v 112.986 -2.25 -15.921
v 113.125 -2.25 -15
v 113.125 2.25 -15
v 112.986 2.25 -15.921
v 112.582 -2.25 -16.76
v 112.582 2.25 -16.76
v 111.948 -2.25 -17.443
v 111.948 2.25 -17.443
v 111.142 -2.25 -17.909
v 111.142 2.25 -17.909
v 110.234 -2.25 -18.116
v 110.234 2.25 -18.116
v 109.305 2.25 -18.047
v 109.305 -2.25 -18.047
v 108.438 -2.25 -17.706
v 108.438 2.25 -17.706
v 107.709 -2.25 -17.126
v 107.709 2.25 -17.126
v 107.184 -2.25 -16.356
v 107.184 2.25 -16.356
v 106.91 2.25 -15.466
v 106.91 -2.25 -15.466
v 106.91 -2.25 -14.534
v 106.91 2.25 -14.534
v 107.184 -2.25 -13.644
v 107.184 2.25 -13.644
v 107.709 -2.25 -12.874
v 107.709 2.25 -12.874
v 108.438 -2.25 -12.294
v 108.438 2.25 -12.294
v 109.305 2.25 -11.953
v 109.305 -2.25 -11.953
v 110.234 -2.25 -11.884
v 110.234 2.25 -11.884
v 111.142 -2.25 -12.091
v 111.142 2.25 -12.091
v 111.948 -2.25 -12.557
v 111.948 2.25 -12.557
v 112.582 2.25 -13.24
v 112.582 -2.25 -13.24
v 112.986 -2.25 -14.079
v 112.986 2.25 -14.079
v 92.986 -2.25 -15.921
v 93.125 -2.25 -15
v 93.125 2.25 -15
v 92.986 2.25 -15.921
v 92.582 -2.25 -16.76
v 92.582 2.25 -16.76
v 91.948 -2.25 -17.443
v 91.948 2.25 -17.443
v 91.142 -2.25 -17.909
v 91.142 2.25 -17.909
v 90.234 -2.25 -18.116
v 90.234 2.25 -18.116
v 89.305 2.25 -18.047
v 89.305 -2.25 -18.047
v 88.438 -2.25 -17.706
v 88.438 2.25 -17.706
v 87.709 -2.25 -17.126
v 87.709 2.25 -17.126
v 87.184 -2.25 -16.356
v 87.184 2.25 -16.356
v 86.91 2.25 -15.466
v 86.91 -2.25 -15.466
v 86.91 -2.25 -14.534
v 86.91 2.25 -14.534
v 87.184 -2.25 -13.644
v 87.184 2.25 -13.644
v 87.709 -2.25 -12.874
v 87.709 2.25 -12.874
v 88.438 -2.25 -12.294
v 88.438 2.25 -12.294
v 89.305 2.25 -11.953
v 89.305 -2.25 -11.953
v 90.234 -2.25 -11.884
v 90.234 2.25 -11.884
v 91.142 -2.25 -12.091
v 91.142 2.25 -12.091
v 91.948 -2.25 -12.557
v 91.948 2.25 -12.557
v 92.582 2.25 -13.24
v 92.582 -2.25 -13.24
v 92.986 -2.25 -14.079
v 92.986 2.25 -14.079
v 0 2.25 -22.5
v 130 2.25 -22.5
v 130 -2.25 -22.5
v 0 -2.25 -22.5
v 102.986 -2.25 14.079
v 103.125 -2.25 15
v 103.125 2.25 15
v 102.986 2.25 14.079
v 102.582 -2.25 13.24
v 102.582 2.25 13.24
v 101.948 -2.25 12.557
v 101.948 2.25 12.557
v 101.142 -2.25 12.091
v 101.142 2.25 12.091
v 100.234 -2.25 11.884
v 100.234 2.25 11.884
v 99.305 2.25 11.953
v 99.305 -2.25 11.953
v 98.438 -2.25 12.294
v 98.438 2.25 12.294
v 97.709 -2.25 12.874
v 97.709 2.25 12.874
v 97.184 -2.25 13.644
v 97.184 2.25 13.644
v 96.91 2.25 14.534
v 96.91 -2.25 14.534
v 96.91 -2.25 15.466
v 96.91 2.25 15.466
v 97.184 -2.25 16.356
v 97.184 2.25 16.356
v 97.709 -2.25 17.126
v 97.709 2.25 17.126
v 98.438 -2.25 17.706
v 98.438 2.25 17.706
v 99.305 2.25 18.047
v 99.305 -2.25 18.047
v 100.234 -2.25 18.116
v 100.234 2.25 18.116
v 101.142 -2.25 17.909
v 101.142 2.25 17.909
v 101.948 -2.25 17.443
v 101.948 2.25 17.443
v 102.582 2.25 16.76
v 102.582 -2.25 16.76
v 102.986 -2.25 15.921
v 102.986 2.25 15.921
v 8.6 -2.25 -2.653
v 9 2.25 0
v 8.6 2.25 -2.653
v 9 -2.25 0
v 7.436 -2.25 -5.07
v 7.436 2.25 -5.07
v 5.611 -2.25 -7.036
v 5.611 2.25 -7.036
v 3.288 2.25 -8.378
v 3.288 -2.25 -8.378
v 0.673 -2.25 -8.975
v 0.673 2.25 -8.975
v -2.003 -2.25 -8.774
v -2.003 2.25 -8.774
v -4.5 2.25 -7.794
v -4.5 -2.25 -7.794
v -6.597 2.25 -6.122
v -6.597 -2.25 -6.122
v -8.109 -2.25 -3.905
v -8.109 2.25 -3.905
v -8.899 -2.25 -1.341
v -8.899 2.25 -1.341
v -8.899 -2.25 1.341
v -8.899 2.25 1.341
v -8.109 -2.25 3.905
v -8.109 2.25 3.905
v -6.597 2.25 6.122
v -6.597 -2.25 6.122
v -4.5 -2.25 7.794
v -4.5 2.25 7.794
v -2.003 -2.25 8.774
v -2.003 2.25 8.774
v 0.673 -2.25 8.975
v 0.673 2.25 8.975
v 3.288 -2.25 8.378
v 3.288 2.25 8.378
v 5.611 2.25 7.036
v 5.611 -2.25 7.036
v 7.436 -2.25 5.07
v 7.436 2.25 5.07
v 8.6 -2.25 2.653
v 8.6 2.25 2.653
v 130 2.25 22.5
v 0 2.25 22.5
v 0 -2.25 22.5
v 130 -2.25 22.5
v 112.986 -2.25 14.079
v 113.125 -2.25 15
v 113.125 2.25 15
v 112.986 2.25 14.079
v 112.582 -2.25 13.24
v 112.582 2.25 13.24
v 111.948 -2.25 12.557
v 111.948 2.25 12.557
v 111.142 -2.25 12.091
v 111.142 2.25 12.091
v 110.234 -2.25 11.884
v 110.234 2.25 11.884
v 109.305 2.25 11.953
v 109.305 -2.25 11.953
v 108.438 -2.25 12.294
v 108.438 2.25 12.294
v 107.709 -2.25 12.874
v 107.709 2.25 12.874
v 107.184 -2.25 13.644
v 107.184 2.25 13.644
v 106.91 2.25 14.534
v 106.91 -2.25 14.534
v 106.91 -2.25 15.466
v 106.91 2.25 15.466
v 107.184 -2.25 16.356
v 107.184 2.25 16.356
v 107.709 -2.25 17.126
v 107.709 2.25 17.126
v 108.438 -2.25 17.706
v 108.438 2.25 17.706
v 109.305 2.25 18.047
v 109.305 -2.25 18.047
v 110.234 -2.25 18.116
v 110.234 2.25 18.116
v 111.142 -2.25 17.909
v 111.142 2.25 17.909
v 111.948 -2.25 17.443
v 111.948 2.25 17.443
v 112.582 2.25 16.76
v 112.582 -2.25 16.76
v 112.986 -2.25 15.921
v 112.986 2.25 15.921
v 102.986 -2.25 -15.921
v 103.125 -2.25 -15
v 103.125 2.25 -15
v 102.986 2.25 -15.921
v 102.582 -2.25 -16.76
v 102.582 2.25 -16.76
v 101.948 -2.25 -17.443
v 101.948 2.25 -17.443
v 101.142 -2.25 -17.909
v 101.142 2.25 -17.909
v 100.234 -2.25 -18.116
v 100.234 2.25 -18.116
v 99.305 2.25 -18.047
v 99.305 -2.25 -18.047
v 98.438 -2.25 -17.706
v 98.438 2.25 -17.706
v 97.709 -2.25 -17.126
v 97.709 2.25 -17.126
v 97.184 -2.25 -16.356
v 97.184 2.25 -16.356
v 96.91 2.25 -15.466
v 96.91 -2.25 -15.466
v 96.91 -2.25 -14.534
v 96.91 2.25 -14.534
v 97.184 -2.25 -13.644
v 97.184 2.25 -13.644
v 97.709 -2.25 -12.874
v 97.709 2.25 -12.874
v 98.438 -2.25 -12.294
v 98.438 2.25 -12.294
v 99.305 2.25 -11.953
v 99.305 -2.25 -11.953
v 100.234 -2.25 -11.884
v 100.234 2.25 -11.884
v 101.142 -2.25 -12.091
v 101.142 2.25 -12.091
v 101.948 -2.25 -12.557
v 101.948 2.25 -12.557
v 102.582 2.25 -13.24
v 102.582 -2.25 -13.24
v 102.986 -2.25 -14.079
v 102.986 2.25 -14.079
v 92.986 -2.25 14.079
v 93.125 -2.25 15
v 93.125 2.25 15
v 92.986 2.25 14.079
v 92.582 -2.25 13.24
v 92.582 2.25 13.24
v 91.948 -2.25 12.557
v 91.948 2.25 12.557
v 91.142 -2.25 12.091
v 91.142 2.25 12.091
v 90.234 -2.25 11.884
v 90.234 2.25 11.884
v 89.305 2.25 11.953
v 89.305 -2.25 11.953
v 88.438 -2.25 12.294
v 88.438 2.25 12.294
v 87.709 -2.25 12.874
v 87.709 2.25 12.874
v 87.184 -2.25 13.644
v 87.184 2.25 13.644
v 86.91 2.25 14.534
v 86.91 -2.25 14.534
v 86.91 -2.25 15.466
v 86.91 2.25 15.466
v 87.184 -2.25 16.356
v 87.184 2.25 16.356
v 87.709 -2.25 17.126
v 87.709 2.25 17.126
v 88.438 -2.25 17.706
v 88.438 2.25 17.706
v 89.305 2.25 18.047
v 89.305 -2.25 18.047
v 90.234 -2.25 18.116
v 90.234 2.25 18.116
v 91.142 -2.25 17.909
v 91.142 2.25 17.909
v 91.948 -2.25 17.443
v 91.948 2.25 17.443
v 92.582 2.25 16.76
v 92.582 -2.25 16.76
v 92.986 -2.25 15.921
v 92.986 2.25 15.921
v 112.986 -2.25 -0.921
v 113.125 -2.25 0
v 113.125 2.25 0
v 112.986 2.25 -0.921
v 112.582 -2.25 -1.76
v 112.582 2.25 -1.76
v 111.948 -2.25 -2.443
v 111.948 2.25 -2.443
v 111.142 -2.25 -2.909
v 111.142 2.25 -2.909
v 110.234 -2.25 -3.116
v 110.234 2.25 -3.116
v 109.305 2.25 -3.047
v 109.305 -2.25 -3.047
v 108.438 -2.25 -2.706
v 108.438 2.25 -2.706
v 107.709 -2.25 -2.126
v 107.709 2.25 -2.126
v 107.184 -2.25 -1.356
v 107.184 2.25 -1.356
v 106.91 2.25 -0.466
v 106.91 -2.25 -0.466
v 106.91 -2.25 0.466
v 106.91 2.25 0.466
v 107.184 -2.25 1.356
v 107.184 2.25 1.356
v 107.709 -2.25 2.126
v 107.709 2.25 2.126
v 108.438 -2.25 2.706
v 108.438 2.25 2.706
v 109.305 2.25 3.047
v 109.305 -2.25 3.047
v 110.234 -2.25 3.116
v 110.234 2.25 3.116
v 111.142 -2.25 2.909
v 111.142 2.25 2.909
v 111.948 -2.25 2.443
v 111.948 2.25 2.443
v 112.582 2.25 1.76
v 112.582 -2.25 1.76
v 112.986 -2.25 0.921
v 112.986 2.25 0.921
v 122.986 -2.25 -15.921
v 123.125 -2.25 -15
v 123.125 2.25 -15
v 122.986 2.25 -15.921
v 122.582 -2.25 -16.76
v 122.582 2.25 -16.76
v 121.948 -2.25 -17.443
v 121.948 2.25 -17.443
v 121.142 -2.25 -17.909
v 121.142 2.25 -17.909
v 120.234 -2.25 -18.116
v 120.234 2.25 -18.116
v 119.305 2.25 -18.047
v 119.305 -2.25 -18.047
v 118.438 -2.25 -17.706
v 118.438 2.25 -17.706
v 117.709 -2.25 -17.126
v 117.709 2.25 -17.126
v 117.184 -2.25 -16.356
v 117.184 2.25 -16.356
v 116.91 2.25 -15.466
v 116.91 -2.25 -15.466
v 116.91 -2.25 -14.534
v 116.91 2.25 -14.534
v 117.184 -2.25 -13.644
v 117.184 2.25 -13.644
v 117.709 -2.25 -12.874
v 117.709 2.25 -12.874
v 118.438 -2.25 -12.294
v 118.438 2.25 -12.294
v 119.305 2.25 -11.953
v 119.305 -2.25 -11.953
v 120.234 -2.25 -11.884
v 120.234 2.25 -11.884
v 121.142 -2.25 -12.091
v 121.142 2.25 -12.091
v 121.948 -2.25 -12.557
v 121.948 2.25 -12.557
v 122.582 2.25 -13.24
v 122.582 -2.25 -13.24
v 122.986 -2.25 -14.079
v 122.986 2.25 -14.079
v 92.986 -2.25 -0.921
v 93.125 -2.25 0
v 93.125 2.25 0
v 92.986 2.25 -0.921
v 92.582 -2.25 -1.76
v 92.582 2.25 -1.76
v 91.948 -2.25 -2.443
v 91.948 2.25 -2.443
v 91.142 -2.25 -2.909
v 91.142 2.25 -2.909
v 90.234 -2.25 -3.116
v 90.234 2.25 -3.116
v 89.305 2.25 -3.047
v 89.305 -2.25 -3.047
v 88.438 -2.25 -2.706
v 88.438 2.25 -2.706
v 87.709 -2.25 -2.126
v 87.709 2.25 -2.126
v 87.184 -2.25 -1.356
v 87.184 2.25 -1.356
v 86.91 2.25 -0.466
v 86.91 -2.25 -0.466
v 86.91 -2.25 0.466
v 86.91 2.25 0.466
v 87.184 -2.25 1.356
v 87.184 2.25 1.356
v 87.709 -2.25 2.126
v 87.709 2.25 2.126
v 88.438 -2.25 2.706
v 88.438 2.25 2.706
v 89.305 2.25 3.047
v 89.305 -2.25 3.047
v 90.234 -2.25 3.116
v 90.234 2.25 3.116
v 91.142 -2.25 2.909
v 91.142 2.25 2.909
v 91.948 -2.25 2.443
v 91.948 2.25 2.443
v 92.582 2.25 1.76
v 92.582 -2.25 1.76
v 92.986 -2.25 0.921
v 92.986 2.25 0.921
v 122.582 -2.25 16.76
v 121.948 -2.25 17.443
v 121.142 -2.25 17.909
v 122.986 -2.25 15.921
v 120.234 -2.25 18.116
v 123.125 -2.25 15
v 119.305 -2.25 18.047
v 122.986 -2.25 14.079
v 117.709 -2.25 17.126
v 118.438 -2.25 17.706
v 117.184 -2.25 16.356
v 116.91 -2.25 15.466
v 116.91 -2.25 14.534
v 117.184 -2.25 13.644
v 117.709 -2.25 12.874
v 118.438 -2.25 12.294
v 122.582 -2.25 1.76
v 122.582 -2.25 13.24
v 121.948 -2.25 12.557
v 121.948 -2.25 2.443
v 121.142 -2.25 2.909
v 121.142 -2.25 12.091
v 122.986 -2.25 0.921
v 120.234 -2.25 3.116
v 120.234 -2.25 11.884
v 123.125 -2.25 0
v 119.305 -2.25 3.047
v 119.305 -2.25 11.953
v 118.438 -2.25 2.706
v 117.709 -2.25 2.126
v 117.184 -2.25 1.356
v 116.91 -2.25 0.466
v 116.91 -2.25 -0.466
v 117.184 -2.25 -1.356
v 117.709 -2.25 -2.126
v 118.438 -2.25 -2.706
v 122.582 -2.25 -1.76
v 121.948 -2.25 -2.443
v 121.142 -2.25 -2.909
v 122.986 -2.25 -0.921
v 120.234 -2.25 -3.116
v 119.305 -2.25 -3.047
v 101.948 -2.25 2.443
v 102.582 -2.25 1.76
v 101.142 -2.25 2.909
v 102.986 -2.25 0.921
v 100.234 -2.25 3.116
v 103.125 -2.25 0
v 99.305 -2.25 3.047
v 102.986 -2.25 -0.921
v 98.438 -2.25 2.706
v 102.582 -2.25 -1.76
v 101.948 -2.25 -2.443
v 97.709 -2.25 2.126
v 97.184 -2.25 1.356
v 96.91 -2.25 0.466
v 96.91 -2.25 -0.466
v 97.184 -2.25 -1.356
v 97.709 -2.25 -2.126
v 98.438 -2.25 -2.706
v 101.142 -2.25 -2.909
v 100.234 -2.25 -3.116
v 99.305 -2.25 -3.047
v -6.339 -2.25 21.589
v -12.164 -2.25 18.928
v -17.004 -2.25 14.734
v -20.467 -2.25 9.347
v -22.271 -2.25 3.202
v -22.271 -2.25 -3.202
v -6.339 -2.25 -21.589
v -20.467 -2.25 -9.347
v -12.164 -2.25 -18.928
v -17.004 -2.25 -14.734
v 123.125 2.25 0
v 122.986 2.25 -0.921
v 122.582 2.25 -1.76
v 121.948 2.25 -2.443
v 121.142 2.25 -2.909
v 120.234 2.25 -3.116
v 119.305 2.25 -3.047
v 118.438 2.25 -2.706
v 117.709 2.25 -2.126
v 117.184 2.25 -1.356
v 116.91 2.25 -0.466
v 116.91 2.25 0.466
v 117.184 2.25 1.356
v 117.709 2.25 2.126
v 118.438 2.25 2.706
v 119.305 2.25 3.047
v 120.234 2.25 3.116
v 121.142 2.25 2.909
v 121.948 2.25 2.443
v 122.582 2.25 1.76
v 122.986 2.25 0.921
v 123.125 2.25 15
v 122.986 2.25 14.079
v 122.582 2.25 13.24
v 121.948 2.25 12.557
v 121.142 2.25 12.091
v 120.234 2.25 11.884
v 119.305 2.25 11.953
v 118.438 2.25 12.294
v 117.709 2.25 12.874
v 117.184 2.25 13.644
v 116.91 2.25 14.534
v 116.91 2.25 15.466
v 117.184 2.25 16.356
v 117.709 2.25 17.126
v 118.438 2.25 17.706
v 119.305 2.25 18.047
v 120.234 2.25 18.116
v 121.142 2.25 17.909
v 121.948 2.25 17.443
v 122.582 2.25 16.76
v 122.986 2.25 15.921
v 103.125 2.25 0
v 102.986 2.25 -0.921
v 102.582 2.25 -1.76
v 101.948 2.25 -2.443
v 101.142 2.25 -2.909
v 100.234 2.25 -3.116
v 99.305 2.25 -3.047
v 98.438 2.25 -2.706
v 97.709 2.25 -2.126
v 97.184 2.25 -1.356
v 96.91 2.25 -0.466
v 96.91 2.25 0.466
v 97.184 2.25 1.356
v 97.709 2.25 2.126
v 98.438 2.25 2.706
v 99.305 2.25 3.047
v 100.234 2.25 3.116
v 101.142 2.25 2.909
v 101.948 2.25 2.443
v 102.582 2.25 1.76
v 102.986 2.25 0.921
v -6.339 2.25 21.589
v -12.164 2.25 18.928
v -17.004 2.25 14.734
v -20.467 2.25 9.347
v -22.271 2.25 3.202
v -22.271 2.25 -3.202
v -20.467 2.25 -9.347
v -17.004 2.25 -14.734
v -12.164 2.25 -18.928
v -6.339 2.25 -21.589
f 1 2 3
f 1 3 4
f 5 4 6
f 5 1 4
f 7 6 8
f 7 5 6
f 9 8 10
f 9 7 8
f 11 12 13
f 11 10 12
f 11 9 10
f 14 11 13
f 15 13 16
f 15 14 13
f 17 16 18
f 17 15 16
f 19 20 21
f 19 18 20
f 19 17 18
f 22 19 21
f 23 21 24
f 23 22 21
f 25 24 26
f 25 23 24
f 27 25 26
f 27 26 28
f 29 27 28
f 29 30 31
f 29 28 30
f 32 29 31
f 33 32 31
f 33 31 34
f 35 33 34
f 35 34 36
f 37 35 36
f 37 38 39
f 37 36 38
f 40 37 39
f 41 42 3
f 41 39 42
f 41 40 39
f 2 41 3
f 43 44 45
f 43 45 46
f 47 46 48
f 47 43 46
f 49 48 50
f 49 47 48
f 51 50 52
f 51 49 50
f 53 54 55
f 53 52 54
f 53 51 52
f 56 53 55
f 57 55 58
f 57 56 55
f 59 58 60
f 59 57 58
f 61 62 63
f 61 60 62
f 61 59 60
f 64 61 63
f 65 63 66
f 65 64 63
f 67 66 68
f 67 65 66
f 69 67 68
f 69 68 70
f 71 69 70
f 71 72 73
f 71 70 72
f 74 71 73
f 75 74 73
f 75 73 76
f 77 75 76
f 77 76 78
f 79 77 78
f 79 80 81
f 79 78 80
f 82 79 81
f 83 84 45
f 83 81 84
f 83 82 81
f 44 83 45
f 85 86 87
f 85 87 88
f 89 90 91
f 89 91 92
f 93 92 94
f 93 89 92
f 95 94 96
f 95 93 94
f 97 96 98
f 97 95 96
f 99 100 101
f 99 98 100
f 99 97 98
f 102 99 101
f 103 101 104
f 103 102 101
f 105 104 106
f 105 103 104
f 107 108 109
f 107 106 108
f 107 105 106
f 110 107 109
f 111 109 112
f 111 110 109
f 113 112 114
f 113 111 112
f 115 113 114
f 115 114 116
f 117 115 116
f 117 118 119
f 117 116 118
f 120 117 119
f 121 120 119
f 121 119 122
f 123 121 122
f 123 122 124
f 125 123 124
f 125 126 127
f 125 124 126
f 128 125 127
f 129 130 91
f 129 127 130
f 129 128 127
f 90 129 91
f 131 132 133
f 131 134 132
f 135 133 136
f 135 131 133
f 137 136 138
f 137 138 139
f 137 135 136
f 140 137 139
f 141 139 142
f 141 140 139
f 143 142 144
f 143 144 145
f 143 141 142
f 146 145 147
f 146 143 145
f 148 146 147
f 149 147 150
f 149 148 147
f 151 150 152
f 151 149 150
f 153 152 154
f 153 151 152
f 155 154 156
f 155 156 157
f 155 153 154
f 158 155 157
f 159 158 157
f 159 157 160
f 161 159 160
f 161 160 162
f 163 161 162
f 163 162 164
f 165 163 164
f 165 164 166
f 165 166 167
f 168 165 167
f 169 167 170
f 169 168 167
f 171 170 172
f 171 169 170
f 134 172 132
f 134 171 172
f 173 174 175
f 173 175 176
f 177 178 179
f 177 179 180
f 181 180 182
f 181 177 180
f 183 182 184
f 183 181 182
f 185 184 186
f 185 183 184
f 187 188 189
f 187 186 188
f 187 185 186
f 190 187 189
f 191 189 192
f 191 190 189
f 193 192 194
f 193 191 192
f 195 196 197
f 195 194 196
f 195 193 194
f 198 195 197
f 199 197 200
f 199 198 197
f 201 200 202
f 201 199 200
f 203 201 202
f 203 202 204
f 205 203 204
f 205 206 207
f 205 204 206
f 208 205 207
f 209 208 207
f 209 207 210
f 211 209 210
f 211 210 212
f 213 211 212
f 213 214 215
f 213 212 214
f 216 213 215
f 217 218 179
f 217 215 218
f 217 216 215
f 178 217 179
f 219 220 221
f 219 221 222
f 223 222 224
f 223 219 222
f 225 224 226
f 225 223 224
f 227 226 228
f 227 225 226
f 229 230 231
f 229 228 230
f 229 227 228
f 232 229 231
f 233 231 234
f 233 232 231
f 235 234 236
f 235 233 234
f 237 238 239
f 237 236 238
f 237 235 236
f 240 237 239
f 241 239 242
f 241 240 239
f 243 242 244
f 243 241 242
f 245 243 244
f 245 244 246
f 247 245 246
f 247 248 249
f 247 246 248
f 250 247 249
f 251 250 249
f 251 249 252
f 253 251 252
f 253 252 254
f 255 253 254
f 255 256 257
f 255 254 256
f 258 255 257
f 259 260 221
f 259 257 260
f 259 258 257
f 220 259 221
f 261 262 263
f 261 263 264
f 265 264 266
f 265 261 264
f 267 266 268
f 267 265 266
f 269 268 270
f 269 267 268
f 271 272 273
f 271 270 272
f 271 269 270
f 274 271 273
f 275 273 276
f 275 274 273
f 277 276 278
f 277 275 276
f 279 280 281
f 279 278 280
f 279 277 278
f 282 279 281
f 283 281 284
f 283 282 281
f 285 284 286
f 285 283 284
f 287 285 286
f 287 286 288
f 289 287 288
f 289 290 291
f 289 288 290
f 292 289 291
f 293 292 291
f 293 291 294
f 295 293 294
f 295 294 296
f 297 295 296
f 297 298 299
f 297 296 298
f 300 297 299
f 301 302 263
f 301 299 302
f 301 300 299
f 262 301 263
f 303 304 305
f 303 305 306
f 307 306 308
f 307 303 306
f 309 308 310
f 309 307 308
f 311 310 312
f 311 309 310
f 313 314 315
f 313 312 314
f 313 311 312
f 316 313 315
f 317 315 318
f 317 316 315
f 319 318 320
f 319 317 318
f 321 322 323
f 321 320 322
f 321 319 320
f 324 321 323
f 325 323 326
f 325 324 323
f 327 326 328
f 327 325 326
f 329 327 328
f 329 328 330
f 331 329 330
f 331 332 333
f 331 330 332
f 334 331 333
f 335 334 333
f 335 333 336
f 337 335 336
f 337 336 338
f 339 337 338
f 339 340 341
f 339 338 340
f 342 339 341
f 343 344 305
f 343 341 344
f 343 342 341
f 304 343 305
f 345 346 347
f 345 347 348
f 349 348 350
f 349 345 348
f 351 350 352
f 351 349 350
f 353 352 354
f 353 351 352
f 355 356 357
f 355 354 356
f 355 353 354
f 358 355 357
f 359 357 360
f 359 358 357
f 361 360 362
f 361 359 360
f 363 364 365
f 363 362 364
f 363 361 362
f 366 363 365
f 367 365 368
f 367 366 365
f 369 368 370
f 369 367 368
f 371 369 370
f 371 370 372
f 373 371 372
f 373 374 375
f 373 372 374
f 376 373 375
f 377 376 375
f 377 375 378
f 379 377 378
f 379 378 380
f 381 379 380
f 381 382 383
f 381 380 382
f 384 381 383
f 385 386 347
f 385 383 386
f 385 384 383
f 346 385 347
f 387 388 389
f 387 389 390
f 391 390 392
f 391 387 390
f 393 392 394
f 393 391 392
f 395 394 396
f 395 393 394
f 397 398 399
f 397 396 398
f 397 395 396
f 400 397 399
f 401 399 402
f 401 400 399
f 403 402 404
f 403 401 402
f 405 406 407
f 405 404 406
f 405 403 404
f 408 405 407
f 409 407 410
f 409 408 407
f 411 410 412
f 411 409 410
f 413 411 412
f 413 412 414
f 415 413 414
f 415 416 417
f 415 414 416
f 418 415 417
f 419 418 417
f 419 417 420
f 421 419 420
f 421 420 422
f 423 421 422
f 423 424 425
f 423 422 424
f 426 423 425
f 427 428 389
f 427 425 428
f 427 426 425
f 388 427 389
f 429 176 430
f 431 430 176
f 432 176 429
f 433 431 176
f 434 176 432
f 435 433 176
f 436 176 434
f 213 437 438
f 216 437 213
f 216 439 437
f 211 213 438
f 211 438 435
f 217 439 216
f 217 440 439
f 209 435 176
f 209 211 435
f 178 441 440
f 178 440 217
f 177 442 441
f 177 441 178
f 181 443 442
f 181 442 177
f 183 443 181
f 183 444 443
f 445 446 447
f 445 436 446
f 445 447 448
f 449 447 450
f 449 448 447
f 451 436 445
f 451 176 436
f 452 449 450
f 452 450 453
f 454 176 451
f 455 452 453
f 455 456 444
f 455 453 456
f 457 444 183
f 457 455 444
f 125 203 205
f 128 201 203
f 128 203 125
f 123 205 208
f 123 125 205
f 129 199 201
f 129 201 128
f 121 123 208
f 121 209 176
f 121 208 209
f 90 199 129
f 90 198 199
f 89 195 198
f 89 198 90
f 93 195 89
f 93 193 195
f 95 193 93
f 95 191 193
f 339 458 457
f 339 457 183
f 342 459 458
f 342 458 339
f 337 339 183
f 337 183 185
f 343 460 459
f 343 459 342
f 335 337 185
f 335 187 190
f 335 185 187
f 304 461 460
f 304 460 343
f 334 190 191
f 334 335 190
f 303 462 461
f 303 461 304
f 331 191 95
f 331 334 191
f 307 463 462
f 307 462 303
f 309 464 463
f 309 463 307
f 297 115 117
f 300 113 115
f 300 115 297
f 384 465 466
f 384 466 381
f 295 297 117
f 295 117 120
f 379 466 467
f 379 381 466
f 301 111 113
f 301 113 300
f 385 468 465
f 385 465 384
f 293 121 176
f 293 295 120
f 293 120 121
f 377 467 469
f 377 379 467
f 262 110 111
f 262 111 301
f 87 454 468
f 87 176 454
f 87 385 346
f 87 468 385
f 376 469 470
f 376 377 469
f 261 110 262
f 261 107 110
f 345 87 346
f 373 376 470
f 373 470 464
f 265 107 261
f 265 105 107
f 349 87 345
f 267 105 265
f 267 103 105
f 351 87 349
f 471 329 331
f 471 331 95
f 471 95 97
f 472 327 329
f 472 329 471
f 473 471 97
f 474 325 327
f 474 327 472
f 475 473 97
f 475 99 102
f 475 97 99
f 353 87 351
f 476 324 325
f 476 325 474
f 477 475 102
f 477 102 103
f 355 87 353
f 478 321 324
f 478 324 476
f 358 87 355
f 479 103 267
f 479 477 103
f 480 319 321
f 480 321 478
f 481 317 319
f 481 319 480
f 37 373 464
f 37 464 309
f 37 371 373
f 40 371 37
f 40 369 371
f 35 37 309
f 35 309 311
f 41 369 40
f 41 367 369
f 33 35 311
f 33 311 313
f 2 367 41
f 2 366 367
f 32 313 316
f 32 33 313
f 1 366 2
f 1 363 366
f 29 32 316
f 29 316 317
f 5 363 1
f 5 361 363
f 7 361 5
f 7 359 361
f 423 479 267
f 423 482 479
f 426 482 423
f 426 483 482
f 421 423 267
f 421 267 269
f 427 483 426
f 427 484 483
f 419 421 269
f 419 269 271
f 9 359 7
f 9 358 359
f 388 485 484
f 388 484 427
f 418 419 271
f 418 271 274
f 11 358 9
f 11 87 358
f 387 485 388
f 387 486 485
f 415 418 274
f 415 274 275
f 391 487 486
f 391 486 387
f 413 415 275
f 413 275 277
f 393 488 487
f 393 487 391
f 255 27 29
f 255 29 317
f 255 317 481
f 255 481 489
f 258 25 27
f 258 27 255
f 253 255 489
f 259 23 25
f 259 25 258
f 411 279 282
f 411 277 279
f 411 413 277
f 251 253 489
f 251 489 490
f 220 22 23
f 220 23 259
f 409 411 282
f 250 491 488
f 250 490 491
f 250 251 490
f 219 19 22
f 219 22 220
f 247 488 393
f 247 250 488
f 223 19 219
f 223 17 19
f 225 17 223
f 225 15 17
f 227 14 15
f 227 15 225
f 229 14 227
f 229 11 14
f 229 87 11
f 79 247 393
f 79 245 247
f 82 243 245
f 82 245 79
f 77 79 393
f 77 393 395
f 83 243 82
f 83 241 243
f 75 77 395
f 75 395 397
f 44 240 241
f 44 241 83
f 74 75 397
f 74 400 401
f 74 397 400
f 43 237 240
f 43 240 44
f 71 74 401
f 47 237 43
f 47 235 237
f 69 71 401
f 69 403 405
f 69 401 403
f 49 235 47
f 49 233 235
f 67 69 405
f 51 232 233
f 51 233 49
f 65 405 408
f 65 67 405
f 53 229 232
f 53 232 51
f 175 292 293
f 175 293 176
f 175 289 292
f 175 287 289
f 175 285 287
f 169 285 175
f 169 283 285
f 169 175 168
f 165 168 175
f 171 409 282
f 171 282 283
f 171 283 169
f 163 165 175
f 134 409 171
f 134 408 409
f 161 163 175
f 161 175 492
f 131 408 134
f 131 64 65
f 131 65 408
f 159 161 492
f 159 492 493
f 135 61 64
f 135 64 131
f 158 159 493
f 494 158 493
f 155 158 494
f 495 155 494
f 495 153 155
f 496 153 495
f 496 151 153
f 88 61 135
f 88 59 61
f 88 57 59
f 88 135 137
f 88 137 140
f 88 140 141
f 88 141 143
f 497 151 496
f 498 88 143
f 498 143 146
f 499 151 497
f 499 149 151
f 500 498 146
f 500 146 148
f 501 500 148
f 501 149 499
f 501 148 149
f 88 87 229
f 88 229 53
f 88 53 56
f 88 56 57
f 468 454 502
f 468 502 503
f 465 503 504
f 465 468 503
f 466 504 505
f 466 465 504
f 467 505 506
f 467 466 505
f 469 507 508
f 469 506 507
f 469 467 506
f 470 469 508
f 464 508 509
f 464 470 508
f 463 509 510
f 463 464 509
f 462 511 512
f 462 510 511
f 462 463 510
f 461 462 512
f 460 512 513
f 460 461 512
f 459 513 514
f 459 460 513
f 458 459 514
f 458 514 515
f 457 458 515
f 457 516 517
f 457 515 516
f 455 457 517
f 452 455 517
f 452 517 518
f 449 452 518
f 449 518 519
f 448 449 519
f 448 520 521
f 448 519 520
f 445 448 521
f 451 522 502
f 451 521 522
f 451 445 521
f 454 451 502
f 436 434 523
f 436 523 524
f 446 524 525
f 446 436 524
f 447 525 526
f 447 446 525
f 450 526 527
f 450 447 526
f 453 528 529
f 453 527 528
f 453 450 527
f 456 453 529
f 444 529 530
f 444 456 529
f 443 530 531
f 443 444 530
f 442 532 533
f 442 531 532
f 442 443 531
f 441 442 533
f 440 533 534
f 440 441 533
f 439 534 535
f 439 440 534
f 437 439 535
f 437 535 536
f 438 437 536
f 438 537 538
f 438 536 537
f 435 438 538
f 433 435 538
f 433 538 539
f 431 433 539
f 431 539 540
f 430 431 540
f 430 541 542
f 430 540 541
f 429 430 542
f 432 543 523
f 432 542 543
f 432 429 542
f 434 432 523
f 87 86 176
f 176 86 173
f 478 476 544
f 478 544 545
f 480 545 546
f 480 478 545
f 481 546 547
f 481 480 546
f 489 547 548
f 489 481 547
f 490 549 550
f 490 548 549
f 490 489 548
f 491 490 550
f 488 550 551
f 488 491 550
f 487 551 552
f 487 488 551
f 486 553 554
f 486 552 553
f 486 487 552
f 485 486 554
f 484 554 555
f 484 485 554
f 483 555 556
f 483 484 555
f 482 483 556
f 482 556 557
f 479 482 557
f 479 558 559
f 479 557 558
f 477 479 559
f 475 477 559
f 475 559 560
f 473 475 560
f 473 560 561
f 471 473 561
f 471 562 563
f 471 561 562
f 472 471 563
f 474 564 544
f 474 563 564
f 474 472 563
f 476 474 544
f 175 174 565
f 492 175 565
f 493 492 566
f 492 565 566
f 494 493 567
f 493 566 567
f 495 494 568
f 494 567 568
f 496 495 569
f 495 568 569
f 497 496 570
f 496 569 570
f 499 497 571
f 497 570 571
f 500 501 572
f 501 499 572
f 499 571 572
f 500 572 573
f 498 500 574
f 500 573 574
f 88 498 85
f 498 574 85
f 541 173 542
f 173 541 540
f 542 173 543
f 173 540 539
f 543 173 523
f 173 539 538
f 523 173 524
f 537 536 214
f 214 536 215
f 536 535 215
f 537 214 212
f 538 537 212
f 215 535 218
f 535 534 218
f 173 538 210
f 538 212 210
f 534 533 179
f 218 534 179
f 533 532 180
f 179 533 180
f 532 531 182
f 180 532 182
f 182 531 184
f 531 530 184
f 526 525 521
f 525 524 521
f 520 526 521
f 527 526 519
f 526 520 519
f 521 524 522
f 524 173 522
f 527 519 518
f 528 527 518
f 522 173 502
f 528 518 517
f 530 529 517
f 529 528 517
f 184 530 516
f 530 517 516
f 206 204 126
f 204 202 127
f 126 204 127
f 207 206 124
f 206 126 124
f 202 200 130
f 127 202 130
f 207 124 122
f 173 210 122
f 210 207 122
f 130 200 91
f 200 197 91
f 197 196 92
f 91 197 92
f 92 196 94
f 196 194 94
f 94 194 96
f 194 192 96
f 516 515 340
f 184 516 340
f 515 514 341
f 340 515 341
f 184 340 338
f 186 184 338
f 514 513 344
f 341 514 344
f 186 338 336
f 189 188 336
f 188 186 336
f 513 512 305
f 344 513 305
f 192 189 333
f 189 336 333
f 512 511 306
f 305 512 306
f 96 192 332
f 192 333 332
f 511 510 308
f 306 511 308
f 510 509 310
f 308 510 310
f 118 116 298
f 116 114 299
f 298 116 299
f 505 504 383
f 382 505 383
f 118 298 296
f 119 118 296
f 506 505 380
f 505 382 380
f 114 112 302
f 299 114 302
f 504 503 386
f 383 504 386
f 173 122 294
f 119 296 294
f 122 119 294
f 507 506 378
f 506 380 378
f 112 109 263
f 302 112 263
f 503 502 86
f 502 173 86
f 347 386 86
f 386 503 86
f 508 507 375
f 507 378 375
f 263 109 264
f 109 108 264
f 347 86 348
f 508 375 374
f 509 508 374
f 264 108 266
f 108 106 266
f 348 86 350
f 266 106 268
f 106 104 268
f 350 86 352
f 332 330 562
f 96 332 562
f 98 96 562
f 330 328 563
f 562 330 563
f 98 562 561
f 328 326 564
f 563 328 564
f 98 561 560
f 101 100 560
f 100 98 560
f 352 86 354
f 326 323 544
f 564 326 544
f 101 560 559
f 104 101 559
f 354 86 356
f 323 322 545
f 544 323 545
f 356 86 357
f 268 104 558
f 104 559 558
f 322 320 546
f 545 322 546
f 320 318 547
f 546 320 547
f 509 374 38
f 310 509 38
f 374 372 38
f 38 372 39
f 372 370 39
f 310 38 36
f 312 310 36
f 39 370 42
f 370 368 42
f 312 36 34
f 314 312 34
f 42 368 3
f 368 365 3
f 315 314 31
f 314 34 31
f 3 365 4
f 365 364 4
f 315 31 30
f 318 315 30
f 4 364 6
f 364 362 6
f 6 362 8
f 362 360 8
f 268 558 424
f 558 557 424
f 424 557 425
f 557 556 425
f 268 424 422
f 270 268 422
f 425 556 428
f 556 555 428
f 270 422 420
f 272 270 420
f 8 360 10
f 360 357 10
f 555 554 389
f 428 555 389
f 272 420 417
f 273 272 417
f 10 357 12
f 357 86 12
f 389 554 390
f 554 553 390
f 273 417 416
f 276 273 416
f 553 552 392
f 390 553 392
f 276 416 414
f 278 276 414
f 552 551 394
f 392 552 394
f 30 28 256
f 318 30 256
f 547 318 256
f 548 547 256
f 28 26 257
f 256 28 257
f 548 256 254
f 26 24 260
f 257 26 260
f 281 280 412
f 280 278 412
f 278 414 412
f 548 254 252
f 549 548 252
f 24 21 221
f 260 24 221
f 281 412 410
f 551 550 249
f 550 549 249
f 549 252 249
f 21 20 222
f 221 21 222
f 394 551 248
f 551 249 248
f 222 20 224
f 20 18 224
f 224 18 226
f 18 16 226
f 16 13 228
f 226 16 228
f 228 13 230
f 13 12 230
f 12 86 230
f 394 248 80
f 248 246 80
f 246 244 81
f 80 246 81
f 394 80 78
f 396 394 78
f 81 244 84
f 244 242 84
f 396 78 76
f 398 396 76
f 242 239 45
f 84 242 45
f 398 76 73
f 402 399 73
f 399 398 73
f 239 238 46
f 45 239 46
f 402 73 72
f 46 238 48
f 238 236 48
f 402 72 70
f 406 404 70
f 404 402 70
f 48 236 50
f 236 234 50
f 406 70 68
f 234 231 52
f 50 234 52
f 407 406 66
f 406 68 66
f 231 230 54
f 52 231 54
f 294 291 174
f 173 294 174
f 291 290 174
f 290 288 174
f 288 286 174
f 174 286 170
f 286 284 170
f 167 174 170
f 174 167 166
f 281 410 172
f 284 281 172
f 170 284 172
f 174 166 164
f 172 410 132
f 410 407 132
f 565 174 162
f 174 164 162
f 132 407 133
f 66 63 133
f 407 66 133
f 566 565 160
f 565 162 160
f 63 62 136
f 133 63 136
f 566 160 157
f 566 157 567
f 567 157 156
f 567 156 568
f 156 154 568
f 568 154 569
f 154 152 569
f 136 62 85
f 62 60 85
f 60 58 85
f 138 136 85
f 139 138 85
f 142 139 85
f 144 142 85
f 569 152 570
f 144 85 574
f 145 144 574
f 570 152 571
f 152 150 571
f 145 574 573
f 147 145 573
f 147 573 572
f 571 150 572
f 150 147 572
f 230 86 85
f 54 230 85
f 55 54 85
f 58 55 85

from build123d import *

# Parameters (mm, degrees)
SKETCH1_R                     = 9
BOSS_EXTRUDE1_DEPTH           = 2.25
CUT_EXTRUDE1_START            = -5.5
SKETCH2_R                     = 3.125
CUT_EXTRUDE1_DEPTH            = 6.5
LPATTERN1_COUNT               = 4
LPATTERN1_PITCH               = 10
LPATTERN2_COUNT               = 2
LPATTERN2_PITCH               = 15
LPATTERN2_START               = -5.5
LPATTERN2_COPY_1_SKETCH_R     = 3.125
LPATTERN2_COPY_1_DEPTH        = 6.5
LPATTERN2_COPY_2_SKETCH_R     = 3.125
LPATTERN2_COPY_2_DEPTH        = 6.5
LPATTERN2_COPY_3_SKETCH_R     = 3.125
LPATTERN2_COPY_3_DEPTH        = 6.5
LPATTERN2_COL_COUNT           = 2
LPATTERN2_COL_PITCH           = 15
LPATTERN2_COL_COPY_1_SKETCH_R = 3.125
LPATTERN2_COL_COPY_1_DEPTH    = 6.5
LPATTERN2_COL_COPY_2_SKETCH_R = 3.125
LPATTERN2_COL_COPY_2_DEPTH    = 6.5
LPATTERN2_COL_COPY_3_SKETCH_R = 3.125
LPATTERN2_COL_COPY_3_DEPTH    = 6.5
CUT_EXTRUDE2_DEPTH            = 1
CUT_EXTRUDE2_DEPTH_BACK       = 5.5


with BuildPart() as part:
    # Sketch1 → Boss-Extrude1 (new body, symmetric)
    with BuildSketch(Plane(origin=(0, 0, 0), x_dir=(1, 0, 0), z_dir=(0, 1, 0))):
        Polygon((130, -22.5), (0, -22.5), (-30, -22.5), (-30, 22.5), (0, 22.5), (130, 22.5), align=None)
        Circle(SKETCH1_R, mode=Mode.SUBTRACT)
    extrude(amount=BOSS_EXTRUDE1_DEPTH, both=True)

    # Sketch2 → Cut-Extrude1 (cut)
    with BuildSketch(Plane(origin=(0, 2.25, 0), x_dir=(1, 0, 0), z_dir=(0, 1, 0)).offset(CUT_EXTRUDE1_START)):
        with Locations((120, 0)):
            Circle(SKETCH2_R)
    cut_extrude1 = extrude(amount=CUT_EXTRUDE1_DEPTH, mode=Mode.SUBTRACT)

    # LPattern1: Cut-Extrude1 ×4
    with Locations(*[(-i * LPATTERN1_PITCH, 0, 0) for i in range(1, LPATTERN1_COUNT)]):
        add(cut_extrude1, mode=Mode.SUBTRACT)

    # LPattern2: Cut-Extrude1 ×2
    with Locations(*[(0, 0, i * LPATTERN2_PITCH) for i in range(1, LPATTERN2_COUNT)]):
        add(cut_extrude1, mode=Mode.SUBTRACT)

    # LPattern2 copy 1 sketch → LPattern2 copy 1 (cut)
    with BuildSketch(Plane(origin=(-10, 2.25, 15), x_dir=(1, 0, 0), z_dir=(0, 1, 0)).offset(LPATTERN2_START)):
        with Locations((120, 0)):
            Circle(LPATTERN2_COPY_1_SKETCH_R)
    extrude(amount=LPATTERN2_COPY_1_DEPTH, mode=Mode.SUBTRACT)

    # LPattern2 copy 2 sketch → LPattern2 copy 2 (cut)
    with BuildSketch(Plane(origin=(-20, 2.25, 15), x_dir=(1, 0, 0), z_dir=(0, 1, 0)).offset(LPATTERN2_START)):
        with Locations((120, 0)):
            Circle(LPATTERN2_COPY_2_SKETCH_R)
    extrude(amount=LPATTERN2_COPY_2_DEPTH, mode=Mode.SUBTRACT)

    # LPattern2 copy 3 sketch → LPattern2 copy 3 (cut)
    with BuildSketch(Plane(origin=(-30, 2.25, 15), x_dir=(1, 0, 0), z_dir=(0, 1, 0)).offset(LPATTERN2_START)):
        with Locations((120, 0)):
            Circle(LPATTERN2_COPY_3_SKETCH_R)
    extrude(amount=LPATTERN2_COPY_3_DEPTH, mode=Mode.SUBTRACT)

    # LPattern2 col: Cut-Extrude1 ×2
    with Locations(*[(0, 0, -i * LPATTERN2_COL_PITCH) for i in range(1, LPATTERN2_COL_COUNT)]):
        add(cut_extrude1, mode=Mode.SUBTRACT)

    # LPattern2 col copy 1 sketch → LPattern2 col copy 1 (cut)
    with BuildSketch(Plane(origin=(-10, 2.25, -15), x_dir=(1, 0, 0), z_dir=(0, 1, 0)).offset(LPATTERN2_START)):
        with Locations((120, 0)):
            Circle(LPATTERN2_COL_COPY_1_SKETCH_R)
    extrude(amount=LPATTERN2_COL_COPY_1_DEPTH, mode=Mode.SUBTRACT)

    # LPattern2 col copy 2 sketch → LPattern2 col copy 2 (cut)
    with BuildSketch(Plane(origin=(-20, 2.25, -15), x_dir=(1, 0, 0), z_dir=(0, 1, 0)).offset(LPATTERN2_START)):
        with Locations((120, 0)):
            Circle(LPATTERN2_COL_COPY_2_SKETCH_R)
    extrude(amount=LPATTERN2_COL_COPY_2_DEPTH, mode=Mode.SUBTRACT)

    # LPattern2 col copy 3 sketch → LPattern2 col copy 3 (cut)
    with BuildSketch(Plane(origin=(-30, 2.25, -15), x_dir=(1, 0, 0), z_dir=(0, 1, 0)).offset(LPATTERN2_START)):
        with Locations((120, 0)):
            Circle(LPATTERN2_COL_COPY_3_SKETCH_R)
    extrude(amount=LPATTERN2_COL_COPY_3_DEPTH, mode=Mode.SUBTRACT)

    # Sketch3 → Cut-Extrude2 (cut, two sides)
    with BuildSketch(Plane(origin=(0, 2.25, 0), x_dir=(1, 0, 0), z_dir=(0, 1, 0))) as cut_extrude2_sk:
        with BuildLine():
            ThreePointArc((-4.9e-08, -22.5), (-22.5, 2.1e-08), (-7e-09, 22.5))
            Line((-7e-09, 22.5), (-30, 22.5))
            Line((-30, 22.5), (-30, -22.5))
            Line((-30, -22.5), (-4.9e-08, -22.5))
        make_face()
    extrude(amount=CUT_EXTRUDE2_DEPTH, mode=Mode.SUBTRACT)
    extrude(cut_extrude2_sk.sketch, amount=-CUT_EXTRUDE2_DEPTH_BACK, mode=Mode.SUBTRACT)


solid = part.part
